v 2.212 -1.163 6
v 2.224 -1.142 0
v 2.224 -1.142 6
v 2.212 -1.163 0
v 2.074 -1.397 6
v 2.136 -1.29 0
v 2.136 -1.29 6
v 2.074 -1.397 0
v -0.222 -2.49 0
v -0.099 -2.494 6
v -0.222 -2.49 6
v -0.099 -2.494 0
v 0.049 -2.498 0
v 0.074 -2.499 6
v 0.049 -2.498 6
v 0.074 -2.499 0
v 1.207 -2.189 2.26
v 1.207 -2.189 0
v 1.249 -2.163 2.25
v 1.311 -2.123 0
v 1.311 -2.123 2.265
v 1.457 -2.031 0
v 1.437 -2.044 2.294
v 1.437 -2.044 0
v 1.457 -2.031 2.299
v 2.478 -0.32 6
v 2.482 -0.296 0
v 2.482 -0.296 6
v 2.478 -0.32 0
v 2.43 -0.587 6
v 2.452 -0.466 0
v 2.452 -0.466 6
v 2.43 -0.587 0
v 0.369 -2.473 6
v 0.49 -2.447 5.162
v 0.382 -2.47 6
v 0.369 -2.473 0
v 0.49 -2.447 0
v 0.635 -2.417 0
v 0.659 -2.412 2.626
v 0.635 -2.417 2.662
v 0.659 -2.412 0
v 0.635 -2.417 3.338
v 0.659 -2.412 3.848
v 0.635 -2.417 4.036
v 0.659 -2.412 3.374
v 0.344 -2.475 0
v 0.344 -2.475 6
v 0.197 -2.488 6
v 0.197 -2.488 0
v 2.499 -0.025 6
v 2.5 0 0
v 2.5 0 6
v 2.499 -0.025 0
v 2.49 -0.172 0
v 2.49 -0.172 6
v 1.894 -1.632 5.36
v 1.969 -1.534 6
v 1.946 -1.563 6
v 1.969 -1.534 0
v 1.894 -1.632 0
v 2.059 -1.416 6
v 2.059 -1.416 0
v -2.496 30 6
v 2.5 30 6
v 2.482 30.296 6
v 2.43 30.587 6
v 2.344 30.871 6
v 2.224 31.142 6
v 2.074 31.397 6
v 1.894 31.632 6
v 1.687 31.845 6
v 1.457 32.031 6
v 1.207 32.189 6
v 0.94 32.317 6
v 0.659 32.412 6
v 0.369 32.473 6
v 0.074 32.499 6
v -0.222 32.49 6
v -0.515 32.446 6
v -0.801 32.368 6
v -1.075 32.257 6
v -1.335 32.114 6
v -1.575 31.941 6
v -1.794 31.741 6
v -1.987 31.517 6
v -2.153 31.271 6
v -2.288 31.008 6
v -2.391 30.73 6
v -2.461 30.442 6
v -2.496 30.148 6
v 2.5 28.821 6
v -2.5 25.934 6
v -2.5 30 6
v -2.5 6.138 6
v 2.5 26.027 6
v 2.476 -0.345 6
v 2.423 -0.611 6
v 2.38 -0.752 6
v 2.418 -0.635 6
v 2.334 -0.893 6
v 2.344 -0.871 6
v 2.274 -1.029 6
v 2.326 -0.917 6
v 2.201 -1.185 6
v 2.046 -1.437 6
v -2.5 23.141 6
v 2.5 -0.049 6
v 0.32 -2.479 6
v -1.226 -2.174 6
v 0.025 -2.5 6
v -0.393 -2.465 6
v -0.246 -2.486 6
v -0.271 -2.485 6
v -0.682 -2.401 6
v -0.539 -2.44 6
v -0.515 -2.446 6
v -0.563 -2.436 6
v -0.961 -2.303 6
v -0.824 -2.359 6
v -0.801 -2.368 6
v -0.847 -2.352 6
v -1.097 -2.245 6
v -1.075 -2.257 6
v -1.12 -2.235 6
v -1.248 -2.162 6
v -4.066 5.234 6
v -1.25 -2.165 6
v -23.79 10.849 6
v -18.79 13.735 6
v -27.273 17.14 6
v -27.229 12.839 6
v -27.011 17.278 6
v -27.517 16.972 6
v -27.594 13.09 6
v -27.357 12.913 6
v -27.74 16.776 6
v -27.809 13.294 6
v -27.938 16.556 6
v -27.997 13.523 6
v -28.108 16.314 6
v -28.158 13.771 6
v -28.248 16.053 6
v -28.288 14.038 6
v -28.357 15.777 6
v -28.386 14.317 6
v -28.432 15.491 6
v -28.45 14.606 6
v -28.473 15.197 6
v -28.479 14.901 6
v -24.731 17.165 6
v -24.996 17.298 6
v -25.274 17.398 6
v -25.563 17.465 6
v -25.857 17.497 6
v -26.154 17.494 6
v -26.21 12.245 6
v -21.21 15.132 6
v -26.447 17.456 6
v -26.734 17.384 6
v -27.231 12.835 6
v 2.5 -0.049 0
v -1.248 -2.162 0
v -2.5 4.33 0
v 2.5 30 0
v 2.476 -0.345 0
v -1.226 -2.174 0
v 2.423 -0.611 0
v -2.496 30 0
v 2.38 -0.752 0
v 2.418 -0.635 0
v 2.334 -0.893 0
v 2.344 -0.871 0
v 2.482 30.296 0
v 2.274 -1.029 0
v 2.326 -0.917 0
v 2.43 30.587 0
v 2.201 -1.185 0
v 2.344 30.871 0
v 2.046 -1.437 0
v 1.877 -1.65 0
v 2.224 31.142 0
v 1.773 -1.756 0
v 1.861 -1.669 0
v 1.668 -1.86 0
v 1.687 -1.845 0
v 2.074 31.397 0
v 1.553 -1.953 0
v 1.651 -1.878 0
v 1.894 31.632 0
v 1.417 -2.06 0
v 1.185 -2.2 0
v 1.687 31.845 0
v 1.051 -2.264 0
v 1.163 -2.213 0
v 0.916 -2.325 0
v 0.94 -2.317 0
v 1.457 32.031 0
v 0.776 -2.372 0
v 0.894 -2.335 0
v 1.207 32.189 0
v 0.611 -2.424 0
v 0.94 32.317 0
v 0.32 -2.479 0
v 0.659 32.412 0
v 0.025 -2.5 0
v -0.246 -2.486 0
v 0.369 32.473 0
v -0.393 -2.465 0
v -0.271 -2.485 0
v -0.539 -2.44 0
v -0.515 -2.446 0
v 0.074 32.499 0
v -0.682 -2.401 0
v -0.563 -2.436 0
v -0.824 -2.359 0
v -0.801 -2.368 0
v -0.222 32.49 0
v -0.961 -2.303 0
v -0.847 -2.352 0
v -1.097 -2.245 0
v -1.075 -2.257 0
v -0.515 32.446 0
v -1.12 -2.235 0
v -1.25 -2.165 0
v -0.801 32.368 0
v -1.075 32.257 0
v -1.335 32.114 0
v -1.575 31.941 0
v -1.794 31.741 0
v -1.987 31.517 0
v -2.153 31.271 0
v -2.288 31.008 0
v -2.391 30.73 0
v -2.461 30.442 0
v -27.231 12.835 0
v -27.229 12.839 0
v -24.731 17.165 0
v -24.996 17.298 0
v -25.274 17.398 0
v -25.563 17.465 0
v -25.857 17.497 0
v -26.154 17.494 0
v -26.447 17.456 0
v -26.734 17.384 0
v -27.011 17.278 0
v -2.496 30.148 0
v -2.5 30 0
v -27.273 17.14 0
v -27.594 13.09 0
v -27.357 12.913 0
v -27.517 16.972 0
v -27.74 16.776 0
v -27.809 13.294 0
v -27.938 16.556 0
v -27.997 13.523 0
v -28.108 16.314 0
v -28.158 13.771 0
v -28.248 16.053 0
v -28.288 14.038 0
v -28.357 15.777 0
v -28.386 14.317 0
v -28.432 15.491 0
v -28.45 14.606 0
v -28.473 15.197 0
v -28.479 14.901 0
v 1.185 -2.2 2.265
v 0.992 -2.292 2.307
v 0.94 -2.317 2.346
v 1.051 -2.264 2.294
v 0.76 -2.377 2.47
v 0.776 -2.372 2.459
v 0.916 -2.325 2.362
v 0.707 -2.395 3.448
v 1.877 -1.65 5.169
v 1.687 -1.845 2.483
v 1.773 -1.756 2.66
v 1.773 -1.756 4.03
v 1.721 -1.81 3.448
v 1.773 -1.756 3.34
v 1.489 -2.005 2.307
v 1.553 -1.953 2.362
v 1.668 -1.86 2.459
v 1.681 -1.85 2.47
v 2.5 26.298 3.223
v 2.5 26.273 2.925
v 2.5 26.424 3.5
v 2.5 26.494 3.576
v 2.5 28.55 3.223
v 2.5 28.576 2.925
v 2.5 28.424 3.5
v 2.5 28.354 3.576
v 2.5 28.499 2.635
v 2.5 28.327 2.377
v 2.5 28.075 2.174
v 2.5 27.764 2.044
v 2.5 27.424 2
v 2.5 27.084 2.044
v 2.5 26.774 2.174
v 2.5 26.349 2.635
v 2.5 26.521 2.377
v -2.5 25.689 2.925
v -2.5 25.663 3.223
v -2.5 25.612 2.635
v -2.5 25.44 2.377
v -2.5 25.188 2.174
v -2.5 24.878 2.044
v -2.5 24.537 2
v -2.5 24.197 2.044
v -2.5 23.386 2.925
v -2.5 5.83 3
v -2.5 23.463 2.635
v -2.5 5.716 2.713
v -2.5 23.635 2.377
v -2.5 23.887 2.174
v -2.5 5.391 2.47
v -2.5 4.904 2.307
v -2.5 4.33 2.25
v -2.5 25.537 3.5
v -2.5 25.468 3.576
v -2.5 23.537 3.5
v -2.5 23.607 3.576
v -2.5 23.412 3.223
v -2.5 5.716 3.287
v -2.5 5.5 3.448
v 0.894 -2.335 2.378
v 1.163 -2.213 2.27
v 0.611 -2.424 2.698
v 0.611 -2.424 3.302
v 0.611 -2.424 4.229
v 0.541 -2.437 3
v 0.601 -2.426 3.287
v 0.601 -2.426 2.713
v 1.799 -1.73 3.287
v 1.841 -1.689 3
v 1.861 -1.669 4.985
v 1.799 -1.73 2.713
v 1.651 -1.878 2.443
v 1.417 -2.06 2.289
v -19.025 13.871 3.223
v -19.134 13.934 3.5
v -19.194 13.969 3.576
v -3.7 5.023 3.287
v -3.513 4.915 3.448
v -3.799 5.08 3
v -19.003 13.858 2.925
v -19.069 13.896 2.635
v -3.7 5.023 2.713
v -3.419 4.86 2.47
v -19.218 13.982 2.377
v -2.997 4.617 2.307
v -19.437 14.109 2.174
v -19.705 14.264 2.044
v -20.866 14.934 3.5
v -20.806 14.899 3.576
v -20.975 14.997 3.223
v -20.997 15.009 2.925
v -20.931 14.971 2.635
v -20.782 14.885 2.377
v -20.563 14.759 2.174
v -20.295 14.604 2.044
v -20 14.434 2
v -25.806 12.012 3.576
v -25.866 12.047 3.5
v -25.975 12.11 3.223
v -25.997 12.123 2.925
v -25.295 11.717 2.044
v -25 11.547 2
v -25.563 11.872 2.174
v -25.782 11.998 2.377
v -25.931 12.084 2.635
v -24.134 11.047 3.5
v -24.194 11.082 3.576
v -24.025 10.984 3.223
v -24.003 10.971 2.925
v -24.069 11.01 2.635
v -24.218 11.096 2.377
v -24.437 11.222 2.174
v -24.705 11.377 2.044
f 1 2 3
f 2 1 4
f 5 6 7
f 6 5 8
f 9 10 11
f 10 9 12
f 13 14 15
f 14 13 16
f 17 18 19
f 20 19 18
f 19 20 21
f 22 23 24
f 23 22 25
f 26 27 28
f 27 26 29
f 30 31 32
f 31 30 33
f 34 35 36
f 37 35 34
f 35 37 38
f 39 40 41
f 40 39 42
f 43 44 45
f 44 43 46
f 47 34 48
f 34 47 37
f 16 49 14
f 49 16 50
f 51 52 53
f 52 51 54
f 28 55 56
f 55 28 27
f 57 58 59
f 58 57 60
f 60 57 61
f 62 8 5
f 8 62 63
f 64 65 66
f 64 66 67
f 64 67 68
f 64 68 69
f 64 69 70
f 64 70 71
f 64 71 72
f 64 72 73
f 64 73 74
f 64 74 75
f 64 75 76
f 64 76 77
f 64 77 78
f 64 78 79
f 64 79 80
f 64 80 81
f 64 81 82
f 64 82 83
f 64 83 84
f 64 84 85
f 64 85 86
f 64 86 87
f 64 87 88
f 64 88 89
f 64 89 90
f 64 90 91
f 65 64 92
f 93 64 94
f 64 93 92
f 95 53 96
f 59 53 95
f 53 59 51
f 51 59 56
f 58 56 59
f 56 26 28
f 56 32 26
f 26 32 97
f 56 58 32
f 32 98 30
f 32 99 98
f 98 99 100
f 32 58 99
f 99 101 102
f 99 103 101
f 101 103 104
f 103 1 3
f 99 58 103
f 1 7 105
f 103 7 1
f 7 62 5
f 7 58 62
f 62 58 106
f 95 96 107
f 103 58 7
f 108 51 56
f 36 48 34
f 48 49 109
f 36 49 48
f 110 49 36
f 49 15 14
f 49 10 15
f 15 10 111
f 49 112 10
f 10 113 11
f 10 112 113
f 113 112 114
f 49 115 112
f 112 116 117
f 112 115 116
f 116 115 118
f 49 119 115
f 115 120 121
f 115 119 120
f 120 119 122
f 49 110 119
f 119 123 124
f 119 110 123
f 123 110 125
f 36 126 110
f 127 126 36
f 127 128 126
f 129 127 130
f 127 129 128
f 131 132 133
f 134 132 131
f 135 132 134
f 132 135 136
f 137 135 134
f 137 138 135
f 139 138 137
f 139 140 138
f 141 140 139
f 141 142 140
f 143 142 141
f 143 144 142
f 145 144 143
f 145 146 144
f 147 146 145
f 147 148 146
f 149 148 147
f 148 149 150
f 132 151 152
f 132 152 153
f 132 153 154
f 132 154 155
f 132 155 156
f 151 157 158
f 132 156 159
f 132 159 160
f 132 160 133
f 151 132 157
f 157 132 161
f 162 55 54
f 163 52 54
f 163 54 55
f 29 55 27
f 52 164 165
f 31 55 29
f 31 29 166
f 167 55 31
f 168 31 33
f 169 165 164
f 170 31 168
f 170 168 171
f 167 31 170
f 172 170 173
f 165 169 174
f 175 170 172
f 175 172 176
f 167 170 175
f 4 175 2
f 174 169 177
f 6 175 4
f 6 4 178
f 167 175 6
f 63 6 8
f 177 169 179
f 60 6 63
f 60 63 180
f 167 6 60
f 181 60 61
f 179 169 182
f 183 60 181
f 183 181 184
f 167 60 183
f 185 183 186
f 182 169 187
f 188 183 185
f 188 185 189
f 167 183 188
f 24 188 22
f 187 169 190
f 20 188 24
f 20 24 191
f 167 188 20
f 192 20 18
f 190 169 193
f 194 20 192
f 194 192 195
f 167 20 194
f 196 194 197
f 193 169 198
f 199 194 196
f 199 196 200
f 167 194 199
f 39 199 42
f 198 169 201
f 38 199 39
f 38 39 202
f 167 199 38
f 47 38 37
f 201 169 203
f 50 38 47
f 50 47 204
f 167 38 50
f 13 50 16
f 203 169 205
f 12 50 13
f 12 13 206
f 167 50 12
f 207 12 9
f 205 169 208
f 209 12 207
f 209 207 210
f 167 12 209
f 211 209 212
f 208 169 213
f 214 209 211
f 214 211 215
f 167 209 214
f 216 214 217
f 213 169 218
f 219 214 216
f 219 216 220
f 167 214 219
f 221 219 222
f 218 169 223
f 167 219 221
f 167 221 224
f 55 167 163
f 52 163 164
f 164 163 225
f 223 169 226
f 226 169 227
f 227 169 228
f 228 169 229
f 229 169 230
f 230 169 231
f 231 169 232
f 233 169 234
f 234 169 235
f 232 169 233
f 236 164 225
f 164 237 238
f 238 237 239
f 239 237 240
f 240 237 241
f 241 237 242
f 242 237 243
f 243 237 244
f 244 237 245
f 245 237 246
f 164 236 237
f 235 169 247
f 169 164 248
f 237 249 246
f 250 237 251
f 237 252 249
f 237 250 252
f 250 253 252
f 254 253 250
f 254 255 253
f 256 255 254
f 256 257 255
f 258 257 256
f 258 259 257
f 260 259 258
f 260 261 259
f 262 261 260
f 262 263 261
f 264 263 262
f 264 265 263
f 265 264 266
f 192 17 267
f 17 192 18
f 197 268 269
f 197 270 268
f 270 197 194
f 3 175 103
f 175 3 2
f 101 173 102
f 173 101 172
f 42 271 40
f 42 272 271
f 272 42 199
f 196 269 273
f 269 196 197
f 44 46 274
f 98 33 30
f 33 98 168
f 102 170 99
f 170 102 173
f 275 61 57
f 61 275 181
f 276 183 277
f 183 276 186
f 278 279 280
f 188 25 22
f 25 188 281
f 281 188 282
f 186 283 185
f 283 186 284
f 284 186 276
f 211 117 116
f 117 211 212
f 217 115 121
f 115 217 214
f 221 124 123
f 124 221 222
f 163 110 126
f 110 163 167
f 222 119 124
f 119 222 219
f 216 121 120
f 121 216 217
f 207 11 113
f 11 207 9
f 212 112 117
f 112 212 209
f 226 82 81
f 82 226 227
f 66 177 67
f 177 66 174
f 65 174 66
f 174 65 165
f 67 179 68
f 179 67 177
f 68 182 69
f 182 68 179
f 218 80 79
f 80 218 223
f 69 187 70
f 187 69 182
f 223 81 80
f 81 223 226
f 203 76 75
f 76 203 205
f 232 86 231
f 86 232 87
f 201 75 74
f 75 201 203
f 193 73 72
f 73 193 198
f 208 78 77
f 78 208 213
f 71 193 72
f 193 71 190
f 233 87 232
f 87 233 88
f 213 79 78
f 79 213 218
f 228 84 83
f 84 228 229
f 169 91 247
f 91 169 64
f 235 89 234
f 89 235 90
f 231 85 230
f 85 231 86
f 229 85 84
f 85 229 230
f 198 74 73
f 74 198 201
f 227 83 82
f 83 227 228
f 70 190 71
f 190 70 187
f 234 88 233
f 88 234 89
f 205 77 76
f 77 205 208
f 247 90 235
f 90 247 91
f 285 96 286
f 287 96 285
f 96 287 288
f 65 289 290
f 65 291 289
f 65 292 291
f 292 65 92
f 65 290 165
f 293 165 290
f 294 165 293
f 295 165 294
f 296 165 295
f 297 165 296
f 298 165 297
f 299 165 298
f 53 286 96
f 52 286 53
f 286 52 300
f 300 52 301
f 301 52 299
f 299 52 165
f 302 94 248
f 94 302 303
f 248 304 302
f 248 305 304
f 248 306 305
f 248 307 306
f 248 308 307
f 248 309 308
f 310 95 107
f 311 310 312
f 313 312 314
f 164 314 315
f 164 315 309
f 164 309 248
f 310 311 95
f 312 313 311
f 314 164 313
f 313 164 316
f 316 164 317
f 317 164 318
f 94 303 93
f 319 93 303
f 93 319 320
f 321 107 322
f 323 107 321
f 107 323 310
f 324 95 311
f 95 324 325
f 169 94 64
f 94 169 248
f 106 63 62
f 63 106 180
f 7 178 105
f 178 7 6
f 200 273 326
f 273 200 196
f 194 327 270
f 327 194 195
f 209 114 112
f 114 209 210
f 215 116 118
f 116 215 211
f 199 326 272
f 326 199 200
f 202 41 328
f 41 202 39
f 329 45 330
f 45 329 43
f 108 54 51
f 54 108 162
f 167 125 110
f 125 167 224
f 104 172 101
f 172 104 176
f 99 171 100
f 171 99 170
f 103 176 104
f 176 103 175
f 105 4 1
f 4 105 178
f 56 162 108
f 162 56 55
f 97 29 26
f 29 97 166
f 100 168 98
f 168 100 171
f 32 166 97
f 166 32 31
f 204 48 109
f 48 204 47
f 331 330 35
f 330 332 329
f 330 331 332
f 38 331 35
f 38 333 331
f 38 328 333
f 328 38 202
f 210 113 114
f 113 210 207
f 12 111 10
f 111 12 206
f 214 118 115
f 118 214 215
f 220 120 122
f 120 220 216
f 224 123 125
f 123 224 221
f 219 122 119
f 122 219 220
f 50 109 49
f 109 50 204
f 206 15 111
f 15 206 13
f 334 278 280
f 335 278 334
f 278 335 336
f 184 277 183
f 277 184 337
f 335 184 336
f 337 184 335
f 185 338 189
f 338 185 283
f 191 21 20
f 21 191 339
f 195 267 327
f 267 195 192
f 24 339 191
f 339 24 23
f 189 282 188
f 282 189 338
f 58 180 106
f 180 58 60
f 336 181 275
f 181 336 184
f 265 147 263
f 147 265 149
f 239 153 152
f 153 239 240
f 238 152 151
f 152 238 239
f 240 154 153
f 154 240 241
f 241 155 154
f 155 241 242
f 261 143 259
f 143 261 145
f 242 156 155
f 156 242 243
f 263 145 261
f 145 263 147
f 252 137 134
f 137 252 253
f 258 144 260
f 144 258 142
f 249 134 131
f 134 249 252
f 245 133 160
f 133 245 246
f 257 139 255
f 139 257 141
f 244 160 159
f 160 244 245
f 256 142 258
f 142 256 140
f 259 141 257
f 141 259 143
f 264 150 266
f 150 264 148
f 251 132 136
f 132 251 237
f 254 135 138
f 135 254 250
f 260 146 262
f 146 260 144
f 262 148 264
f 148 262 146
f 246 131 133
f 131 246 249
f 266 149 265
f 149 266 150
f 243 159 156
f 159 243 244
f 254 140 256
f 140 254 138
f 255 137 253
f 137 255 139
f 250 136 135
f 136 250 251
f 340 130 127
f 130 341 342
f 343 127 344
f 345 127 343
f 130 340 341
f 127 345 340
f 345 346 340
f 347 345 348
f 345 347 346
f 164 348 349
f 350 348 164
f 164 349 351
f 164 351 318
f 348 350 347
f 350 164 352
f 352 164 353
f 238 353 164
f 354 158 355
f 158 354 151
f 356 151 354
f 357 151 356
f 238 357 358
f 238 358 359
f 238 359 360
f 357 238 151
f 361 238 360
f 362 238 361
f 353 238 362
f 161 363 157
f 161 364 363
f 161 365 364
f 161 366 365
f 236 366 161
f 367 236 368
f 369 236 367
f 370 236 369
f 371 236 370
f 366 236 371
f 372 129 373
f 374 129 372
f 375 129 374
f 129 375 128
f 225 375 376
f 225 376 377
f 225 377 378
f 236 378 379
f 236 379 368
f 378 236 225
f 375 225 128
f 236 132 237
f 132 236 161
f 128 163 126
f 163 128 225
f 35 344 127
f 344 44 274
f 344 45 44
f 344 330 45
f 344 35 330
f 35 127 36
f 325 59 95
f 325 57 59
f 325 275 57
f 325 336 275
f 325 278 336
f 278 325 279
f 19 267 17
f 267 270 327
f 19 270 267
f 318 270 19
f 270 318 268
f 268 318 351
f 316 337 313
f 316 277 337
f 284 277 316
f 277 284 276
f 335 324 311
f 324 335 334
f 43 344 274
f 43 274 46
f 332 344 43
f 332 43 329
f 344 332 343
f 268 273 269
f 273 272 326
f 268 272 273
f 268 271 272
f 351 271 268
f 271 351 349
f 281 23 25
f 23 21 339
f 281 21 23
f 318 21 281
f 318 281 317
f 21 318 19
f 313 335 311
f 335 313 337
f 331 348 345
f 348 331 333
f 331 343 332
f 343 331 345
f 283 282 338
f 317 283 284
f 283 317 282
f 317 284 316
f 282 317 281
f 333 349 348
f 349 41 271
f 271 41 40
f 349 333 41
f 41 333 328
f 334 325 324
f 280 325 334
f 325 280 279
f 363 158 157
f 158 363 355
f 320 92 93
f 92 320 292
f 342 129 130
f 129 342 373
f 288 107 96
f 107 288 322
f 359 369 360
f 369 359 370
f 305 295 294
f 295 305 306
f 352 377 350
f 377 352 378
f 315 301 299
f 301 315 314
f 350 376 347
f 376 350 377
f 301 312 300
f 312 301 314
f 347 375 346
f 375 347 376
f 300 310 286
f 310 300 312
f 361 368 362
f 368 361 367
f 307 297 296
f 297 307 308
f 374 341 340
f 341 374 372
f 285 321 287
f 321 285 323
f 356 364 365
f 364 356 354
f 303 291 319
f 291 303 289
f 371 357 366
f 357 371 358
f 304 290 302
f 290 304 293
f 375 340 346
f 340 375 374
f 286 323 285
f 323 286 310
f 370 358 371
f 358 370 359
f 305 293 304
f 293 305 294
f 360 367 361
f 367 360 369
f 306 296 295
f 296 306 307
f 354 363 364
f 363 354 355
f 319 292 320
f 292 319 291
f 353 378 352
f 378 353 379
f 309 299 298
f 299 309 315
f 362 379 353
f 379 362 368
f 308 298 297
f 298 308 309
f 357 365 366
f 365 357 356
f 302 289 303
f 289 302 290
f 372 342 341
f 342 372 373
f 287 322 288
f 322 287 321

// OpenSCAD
dia1   = 1.5;
dia2   = 2.0;
height = 6.0;
thickn = 5;
// Larger variant, can be set with -D option to openscad:
// dia2   = 3.2;
// height = 7;
// thickn = 6;

module antenna_piece (l=30, t=thickn, h=height, hh=3, wd1=dia1, wd2=dia2, phi=60)
{
    d1 = 0.7;
    d2 = 1.2;
    ll = l;
    alpha = 
        [ atan (((d2 - d1) / 2 * wd1) / hh)
        , atan (((d2 - d1) / 2 * wd2) / hh)
        ];
    difference () {
        for (p = [0, phi]) {
            rotate ([0, 0, p]) {
                for (y = [0, ll]) {
                    translate ([0, y, 0])
                        cylinder (r=t/2, h=h);
                }
                translate ([0, (ll)/2, h/2])
                    cube ([t, ll, h], center=true);
            }
        }
        for (y = [0, l-(1.25*wd2 + t)]) {
            rotate ([0, 0, phi/2 + (y?0:90)]) {
                translate ([-l, y, h-hh])
                    rotate ([0, 90, 0])
                        cylinder (r=(y?wd2:wd1)/2, h=2*l);
                for (p = [-(alpha [y?1:0]), (alpha [y?1:0])]) {
                    translate ([0, y, h-hh])
                        rotate ([p, 0, 0])
                            translate ([0, 0, h])
                                cube ([2*l, (y?wd2:wd1)*d1, 2*h], center=true);
                }
            }
        }
    }
}

antenna_piece ($fa = 2, $fs = .3);
